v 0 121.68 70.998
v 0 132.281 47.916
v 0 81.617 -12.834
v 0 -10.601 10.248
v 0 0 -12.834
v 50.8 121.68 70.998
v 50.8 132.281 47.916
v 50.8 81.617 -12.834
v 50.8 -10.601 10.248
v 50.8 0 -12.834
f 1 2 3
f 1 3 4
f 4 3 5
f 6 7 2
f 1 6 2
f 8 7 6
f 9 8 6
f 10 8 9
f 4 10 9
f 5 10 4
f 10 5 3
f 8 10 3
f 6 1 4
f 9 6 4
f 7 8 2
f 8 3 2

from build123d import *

# Parameters (mm, degrees)
F1_DEPTH = 25.4
F2_DEPTH = 25.4
F3_DEPTH = 25.4


with BuildPart() as f1:
    # F0 (on Right) → F1 (new body)
    with BuildSketch(Plane.YZ):
        Polygon((0, -12.8344558179), (61.9691237807, -12.8344558179), (81.6171616316, -12.8344558179), (132.2807371616, 47.9157753289), align=None)
    extrude(amount=F1_DEPTH)

    # F2 (add): a face of the model
    f2_faces = [f1.faces().sort_by_distance(p)[0] for p in [
        (25.4, 71.2992995977, 7.415621231),
    ]]
    extrude(f2_faces, amount=F2_DEPTH)

    # F3 (add): a face of the model
    f3_faces = [f1.faces().sort_by_distance(p)[0] for p in [
        (25.4, 66.1403685808, 17.5406597555),
    ]]
    extrude(f3_faces, amount=F3_DEPTH)


solid = f1.part
